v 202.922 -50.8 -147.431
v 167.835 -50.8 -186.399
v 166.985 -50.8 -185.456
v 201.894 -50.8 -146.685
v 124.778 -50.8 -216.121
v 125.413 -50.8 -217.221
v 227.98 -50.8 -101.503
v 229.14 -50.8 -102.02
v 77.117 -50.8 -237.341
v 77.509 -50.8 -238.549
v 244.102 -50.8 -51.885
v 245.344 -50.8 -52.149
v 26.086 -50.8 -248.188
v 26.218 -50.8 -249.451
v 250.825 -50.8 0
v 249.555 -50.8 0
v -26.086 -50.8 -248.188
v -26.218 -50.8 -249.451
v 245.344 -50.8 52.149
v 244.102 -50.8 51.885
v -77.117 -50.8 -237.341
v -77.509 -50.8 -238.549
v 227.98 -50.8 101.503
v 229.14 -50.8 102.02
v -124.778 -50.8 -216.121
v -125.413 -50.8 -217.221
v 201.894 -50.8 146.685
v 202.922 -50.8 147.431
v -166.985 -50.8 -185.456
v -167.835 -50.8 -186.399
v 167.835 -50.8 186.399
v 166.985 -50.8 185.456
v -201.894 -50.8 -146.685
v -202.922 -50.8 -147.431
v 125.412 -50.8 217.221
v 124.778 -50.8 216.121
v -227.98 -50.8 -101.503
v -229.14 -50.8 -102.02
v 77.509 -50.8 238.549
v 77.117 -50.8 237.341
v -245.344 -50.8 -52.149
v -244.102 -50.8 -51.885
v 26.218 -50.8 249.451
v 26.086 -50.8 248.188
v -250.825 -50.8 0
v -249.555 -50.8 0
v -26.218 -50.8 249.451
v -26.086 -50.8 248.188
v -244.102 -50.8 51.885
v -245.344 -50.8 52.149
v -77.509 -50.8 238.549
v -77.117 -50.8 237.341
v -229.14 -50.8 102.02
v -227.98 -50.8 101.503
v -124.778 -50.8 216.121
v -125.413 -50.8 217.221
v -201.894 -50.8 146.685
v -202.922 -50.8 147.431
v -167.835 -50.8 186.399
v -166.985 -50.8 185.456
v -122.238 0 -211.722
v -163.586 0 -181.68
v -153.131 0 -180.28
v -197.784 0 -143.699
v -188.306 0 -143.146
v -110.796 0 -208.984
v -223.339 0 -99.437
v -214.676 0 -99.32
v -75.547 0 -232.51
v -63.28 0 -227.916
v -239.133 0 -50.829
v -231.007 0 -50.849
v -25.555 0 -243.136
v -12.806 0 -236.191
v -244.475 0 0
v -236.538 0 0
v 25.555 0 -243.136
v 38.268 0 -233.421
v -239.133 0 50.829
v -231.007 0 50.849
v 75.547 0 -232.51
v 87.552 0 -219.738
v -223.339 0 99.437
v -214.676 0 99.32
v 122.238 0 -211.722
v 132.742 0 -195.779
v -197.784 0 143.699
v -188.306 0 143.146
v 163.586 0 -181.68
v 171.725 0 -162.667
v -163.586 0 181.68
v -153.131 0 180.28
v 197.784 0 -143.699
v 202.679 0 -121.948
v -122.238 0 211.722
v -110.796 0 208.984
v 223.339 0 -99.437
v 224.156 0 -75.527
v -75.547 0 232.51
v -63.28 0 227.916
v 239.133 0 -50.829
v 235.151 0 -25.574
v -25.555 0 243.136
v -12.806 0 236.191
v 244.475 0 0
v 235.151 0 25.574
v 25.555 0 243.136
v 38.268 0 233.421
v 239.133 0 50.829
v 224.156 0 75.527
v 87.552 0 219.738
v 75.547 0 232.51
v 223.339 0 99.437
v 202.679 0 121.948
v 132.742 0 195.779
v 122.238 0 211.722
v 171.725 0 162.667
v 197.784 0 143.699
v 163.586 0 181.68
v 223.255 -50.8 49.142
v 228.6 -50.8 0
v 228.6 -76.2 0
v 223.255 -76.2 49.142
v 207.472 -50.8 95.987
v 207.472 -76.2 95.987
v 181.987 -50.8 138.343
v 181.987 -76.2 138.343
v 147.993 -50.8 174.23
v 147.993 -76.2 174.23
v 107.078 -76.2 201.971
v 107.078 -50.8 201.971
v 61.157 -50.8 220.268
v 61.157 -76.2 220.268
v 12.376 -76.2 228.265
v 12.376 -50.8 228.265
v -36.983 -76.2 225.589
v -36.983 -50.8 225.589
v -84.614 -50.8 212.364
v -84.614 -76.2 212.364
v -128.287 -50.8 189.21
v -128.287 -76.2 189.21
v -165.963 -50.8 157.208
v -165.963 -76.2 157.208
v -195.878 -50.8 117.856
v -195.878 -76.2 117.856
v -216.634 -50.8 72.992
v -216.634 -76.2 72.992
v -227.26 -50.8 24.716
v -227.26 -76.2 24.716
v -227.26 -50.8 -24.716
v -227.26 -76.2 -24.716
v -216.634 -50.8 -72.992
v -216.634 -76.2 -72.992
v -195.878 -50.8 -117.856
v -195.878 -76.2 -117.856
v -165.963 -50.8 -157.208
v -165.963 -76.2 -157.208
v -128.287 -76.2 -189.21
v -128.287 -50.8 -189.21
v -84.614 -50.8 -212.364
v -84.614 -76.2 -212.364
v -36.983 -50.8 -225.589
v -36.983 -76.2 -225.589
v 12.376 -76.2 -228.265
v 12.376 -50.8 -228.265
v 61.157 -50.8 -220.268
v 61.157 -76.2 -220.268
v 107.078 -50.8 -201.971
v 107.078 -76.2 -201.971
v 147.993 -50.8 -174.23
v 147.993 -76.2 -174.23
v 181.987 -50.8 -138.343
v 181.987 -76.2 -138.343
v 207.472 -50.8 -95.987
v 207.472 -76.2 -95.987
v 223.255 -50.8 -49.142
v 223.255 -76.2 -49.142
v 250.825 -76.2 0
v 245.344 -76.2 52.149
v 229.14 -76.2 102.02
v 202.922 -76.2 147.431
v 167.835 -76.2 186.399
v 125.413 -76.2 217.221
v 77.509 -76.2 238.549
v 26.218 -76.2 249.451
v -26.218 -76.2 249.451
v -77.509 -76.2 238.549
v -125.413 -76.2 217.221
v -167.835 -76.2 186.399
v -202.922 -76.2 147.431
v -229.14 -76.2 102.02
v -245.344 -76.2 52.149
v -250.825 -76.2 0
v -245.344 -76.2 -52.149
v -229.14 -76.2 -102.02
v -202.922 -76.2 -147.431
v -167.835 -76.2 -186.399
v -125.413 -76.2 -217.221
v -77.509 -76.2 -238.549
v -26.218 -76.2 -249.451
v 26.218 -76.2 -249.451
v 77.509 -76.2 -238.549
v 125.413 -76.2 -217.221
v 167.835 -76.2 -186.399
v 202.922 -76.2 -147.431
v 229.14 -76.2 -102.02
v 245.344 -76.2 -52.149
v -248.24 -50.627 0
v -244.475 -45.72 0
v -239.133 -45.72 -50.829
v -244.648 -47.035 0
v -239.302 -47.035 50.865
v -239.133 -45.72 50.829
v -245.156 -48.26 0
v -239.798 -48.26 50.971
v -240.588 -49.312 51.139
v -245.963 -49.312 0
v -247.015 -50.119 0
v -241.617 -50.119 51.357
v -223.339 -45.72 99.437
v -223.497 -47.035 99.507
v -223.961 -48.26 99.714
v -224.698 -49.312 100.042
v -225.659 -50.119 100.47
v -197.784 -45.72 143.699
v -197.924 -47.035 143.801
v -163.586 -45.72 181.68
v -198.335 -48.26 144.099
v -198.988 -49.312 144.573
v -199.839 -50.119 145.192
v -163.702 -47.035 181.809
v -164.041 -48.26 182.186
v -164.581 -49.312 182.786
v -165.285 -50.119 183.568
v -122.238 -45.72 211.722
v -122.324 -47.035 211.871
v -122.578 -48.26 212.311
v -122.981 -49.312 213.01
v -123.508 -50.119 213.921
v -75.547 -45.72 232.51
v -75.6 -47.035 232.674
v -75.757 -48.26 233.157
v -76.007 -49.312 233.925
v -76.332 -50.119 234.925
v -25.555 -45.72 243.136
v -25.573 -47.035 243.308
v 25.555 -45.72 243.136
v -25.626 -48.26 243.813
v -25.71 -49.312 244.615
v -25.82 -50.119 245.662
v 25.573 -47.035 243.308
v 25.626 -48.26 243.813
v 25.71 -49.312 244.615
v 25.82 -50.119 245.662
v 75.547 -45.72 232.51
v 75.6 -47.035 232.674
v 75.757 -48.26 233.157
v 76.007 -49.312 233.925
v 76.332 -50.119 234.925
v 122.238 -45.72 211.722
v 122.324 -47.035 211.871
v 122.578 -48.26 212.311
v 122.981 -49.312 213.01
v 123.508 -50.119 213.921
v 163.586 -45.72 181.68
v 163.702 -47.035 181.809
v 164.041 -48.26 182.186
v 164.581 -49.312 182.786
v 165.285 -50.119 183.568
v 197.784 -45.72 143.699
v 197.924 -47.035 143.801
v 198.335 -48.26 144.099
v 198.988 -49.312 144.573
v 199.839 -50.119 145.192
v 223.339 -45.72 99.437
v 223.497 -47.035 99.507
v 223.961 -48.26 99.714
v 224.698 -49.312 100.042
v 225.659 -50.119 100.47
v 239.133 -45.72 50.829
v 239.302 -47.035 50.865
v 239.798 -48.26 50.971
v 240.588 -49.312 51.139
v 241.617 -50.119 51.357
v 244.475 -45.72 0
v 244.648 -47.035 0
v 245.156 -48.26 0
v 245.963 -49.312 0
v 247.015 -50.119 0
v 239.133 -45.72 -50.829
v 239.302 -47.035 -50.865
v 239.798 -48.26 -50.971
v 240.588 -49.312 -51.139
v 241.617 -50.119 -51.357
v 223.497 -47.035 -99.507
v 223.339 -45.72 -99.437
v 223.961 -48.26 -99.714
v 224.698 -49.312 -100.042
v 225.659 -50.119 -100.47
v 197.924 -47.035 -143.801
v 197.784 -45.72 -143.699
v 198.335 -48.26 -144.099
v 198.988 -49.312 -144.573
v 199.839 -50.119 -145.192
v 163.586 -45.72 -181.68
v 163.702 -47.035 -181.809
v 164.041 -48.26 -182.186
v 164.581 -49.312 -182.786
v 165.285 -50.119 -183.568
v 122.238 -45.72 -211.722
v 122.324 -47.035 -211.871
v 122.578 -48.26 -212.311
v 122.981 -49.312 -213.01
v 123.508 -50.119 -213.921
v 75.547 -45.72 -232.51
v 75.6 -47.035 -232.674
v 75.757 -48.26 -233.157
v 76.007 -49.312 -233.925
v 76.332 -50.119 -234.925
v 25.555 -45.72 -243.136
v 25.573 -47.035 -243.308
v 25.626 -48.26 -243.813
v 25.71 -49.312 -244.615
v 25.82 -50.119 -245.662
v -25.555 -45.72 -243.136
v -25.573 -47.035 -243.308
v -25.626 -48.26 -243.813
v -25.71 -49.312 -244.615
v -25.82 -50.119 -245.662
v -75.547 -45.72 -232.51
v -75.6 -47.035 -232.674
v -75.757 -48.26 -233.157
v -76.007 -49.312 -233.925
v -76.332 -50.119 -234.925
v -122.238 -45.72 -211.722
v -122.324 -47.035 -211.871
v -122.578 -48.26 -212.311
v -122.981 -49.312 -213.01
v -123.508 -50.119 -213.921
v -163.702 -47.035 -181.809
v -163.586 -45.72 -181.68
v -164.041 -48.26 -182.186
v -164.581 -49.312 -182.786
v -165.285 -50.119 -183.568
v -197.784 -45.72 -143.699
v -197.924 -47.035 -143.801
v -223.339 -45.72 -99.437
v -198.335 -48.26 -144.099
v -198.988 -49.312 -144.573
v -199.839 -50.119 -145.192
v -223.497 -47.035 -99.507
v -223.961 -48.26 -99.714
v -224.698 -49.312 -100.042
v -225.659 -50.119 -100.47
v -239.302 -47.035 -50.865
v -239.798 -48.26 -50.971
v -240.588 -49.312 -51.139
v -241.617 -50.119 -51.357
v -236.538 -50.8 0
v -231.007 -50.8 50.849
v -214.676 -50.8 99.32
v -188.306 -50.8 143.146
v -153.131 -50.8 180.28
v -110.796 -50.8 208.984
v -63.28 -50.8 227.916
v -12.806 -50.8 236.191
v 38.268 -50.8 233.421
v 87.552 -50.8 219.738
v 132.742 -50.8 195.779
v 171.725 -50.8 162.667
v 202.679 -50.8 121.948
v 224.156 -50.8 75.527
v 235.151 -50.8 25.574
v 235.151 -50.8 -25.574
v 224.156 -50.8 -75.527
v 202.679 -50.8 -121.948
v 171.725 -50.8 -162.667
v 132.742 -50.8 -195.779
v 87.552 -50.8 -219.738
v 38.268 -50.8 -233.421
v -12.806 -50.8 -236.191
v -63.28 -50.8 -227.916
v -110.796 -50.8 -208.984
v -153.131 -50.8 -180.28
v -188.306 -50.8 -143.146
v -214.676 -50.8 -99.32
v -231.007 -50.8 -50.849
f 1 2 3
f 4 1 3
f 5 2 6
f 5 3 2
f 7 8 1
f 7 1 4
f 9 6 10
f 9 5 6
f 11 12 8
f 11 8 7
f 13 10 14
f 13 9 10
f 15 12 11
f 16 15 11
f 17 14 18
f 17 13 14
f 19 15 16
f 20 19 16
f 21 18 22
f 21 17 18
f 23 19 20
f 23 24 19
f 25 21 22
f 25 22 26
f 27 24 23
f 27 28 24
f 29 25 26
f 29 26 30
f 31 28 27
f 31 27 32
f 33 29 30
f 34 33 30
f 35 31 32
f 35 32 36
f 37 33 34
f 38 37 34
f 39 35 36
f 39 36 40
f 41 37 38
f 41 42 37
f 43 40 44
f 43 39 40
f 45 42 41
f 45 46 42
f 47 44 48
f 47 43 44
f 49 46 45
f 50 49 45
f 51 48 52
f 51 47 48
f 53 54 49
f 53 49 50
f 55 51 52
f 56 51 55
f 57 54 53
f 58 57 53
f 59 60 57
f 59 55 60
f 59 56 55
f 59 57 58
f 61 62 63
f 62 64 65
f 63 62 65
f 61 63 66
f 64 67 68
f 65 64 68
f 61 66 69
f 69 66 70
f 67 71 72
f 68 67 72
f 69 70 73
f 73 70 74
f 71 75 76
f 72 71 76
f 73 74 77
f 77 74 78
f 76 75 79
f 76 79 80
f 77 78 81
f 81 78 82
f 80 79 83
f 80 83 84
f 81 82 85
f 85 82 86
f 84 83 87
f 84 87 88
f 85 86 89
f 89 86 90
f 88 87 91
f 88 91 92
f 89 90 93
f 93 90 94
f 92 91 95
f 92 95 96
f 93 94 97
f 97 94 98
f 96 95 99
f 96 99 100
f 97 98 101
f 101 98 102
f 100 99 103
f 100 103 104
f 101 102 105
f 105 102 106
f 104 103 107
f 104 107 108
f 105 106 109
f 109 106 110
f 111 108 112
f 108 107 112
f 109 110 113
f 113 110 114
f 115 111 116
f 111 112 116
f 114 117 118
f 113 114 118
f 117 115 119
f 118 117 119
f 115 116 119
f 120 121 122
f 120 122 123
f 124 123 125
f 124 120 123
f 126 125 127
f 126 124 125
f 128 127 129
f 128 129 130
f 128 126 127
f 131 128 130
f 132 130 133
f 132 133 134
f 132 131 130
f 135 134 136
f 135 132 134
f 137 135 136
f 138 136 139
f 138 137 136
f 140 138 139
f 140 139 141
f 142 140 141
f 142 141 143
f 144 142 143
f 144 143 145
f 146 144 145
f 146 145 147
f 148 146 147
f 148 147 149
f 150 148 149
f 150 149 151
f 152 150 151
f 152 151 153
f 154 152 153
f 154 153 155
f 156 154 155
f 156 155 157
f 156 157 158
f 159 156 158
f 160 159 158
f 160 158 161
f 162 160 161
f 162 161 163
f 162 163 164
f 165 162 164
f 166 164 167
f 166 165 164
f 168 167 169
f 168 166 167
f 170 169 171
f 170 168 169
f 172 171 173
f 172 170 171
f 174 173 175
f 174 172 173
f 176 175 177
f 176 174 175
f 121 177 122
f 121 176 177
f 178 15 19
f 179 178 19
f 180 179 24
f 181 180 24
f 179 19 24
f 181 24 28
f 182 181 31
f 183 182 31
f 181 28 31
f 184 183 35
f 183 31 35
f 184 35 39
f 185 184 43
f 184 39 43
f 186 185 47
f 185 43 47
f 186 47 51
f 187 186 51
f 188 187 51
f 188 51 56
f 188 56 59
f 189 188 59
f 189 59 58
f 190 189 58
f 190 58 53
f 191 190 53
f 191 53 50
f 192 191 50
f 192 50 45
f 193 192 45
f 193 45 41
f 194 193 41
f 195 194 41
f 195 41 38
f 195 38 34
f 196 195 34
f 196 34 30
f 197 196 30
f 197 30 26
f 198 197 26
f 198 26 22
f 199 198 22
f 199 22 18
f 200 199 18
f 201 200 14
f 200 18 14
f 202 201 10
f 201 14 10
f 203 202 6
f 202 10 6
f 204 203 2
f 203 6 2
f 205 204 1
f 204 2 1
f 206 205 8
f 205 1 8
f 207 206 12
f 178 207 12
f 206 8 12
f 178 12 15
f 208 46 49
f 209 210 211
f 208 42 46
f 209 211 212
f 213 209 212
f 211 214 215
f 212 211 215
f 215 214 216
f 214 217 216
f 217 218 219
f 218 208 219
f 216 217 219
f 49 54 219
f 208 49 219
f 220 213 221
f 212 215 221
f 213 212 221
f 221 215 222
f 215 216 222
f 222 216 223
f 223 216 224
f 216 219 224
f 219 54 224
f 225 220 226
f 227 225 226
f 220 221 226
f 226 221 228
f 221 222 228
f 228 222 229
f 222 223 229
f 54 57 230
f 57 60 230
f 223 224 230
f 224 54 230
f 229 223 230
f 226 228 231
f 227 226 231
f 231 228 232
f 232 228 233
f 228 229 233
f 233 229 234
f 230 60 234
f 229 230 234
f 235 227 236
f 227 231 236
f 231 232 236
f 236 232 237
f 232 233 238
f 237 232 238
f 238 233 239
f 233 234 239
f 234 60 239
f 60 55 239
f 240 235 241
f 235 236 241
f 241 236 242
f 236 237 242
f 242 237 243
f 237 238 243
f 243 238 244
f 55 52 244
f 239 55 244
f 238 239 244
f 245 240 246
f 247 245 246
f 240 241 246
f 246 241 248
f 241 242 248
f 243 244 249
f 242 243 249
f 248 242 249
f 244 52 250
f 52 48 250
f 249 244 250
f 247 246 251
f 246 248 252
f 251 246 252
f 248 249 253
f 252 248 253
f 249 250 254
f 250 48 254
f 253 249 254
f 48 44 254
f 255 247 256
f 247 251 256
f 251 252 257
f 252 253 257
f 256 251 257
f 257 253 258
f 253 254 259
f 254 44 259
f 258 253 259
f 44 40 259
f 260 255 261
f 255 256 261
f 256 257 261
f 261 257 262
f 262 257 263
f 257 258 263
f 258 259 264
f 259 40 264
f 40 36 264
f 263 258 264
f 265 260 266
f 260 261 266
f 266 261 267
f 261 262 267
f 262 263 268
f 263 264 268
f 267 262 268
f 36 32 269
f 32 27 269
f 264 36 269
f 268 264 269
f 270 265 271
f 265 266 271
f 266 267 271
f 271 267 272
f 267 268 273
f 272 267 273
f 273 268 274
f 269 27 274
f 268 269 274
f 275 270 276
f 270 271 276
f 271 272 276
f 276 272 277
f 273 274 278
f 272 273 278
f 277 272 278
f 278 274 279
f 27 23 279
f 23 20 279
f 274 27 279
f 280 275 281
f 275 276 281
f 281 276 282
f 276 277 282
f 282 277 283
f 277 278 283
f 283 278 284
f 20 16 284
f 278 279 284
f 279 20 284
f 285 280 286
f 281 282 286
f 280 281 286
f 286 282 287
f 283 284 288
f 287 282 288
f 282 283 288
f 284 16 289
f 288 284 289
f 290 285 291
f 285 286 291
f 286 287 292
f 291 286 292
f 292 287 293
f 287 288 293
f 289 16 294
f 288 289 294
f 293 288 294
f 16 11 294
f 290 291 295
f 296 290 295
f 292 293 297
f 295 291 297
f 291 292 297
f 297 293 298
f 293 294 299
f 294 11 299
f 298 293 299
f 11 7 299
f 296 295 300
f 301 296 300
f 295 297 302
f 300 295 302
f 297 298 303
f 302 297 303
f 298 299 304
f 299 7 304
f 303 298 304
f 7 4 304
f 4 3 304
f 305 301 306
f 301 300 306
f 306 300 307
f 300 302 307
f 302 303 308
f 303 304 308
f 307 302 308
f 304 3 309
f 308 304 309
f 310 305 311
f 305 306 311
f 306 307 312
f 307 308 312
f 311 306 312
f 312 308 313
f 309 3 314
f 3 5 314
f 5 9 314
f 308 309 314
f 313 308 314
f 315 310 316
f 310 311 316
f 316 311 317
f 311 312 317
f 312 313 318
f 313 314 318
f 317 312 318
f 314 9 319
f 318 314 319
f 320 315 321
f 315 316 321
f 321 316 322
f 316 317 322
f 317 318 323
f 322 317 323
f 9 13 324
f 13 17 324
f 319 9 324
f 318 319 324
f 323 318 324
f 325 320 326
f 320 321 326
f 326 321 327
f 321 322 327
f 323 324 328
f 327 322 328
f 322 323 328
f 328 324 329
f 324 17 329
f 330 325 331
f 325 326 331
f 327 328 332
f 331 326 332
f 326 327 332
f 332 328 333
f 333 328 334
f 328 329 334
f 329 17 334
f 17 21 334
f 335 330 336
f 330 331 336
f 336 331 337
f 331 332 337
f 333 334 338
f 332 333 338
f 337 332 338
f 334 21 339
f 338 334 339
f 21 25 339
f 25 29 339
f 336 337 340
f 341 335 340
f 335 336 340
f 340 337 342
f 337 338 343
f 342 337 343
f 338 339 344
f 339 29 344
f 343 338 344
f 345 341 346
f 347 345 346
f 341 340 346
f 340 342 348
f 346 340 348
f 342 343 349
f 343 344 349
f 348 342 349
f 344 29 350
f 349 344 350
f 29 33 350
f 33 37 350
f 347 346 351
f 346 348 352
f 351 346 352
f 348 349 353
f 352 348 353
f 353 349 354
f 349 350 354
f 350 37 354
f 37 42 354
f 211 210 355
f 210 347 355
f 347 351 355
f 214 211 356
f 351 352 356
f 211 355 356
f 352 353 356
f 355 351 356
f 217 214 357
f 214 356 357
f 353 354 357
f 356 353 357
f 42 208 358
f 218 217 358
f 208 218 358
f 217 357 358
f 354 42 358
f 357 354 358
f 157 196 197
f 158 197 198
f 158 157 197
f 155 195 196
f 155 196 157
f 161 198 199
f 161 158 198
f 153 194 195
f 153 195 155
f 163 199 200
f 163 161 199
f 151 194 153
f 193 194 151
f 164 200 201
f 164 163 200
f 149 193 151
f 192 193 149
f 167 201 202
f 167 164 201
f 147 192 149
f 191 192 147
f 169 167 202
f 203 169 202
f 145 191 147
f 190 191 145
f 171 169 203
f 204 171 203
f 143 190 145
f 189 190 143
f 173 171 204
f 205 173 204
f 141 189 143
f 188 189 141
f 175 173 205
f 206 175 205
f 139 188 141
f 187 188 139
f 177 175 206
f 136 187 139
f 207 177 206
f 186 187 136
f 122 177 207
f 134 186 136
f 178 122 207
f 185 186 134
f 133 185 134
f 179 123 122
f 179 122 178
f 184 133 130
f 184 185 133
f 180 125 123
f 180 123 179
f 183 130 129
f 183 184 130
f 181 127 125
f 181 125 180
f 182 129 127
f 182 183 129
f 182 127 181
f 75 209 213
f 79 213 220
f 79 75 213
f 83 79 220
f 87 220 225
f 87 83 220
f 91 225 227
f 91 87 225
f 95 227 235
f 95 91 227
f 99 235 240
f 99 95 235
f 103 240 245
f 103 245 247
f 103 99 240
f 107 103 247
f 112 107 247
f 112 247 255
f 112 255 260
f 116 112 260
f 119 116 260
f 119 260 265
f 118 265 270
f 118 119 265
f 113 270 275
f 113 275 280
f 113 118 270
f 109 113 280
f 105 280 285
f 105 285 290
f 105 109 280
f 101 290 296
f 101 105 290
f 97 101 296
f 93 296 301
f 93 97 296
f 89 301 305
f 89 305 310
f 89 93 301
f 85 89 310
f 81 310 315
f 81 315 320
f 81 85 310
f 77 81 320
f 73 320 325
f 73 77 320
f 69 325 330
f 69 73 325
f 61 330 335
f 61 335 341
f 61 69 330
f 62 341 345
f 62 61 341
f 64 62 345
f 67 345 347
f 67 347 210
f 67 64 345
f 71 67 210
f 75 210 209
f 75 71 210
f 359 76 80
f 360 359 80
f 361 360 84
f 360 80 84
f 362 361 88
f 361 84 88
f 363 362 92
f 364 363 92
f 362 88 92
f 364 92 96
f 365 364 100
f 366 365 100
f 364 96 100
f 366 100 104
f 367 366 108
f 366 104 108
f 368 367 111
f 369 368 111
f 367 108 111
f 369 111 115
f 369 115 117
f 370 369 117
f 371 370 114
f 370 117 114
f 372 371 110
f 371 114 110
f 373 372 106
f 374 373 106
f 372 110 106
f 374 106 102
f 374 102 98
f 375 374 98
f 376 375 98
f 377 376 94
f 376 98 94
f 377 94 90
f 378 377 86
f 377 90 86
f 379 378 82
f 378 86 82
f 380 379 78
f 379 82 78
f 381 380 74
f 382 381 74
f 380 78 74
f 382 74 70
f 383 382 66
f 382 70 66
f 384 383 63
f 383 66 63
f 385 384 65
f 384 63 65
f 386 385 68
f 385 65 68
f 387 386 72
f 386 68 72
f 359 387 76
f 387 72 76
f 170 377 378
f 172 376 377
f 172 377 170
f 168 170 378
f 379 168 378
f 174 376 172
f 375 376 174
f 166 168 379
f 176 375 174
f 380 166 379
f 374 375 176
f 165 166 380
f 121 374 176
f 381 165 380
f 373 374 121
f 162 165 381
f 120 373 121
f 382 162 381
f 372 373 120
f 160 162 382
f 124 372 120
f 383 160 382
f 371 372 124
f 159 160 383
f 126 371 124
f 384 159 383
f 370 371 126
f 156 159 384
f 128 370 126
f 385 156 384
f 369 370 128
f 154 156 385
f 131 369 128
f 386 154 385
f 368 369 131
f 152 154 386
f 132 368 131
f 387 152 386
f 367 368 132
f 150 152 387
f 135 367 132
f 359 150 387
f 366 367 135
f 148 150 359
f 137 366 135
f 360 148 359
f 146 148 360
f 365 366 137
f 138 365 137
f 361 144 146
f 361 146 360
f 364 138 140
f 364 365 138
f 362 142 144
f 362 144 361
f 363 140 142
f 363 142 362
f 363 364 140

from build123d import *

# Parameters (mm, degrees)
F0_R     = 250.825
F0_R_2   = 228.6
F1_DEPTH = 76.2
F2_R     = 250.825
F2_R_2   = 244.475
F3_DEPTH = 50.8
F4_R     = 5.08
F5_R     = 236.5375
F5_R_2   = 228.6
F6_DEPTH = 50.8


with BuildPart() as f1:
    # F0 (on Front) → F1 (new body)
    with BuildSketch(Plane.XZ):
        Circle(F0_R)
        Circle(F0_R_2, mode=Mode.SUBTRACT)
    extrude(amount=F1_DEPTH)

    # F2 (on face) → F3 (cut)
    with BuildSketch(Plane(origin=(0, 0, 0), x_dir=(-1, 0, 0), z_dir=(0, 1, 0))):
        Circle(F2_R)
        Circle(F2_R_2, mode=Mode.SUBTRACT)
    extrude(amount=-F3_DEPTH, mode=Mode.SUBTRACT)

    # F4
    f4_edges = [f1.edges().sort_by_distance(p)[0] for p in [
        (244.475, -50.8, 0),
    ]]
    fillet(f4_edges, radius=F4_R)

    # F5 (on face) → F6 (cut)
    with BuildSketch(Plane(origin=(0, 0, 0), x_dir=(-1, 0, 0), z_dir=(0, 1, 0))):
        Circle(F5_R)
        Circle(F5_R_2, mode=Mode.SUBTRACT)
    extrude(amount=-F6_DEPTH, mode=Mode.SUBTRACT)


solid = f1.part
